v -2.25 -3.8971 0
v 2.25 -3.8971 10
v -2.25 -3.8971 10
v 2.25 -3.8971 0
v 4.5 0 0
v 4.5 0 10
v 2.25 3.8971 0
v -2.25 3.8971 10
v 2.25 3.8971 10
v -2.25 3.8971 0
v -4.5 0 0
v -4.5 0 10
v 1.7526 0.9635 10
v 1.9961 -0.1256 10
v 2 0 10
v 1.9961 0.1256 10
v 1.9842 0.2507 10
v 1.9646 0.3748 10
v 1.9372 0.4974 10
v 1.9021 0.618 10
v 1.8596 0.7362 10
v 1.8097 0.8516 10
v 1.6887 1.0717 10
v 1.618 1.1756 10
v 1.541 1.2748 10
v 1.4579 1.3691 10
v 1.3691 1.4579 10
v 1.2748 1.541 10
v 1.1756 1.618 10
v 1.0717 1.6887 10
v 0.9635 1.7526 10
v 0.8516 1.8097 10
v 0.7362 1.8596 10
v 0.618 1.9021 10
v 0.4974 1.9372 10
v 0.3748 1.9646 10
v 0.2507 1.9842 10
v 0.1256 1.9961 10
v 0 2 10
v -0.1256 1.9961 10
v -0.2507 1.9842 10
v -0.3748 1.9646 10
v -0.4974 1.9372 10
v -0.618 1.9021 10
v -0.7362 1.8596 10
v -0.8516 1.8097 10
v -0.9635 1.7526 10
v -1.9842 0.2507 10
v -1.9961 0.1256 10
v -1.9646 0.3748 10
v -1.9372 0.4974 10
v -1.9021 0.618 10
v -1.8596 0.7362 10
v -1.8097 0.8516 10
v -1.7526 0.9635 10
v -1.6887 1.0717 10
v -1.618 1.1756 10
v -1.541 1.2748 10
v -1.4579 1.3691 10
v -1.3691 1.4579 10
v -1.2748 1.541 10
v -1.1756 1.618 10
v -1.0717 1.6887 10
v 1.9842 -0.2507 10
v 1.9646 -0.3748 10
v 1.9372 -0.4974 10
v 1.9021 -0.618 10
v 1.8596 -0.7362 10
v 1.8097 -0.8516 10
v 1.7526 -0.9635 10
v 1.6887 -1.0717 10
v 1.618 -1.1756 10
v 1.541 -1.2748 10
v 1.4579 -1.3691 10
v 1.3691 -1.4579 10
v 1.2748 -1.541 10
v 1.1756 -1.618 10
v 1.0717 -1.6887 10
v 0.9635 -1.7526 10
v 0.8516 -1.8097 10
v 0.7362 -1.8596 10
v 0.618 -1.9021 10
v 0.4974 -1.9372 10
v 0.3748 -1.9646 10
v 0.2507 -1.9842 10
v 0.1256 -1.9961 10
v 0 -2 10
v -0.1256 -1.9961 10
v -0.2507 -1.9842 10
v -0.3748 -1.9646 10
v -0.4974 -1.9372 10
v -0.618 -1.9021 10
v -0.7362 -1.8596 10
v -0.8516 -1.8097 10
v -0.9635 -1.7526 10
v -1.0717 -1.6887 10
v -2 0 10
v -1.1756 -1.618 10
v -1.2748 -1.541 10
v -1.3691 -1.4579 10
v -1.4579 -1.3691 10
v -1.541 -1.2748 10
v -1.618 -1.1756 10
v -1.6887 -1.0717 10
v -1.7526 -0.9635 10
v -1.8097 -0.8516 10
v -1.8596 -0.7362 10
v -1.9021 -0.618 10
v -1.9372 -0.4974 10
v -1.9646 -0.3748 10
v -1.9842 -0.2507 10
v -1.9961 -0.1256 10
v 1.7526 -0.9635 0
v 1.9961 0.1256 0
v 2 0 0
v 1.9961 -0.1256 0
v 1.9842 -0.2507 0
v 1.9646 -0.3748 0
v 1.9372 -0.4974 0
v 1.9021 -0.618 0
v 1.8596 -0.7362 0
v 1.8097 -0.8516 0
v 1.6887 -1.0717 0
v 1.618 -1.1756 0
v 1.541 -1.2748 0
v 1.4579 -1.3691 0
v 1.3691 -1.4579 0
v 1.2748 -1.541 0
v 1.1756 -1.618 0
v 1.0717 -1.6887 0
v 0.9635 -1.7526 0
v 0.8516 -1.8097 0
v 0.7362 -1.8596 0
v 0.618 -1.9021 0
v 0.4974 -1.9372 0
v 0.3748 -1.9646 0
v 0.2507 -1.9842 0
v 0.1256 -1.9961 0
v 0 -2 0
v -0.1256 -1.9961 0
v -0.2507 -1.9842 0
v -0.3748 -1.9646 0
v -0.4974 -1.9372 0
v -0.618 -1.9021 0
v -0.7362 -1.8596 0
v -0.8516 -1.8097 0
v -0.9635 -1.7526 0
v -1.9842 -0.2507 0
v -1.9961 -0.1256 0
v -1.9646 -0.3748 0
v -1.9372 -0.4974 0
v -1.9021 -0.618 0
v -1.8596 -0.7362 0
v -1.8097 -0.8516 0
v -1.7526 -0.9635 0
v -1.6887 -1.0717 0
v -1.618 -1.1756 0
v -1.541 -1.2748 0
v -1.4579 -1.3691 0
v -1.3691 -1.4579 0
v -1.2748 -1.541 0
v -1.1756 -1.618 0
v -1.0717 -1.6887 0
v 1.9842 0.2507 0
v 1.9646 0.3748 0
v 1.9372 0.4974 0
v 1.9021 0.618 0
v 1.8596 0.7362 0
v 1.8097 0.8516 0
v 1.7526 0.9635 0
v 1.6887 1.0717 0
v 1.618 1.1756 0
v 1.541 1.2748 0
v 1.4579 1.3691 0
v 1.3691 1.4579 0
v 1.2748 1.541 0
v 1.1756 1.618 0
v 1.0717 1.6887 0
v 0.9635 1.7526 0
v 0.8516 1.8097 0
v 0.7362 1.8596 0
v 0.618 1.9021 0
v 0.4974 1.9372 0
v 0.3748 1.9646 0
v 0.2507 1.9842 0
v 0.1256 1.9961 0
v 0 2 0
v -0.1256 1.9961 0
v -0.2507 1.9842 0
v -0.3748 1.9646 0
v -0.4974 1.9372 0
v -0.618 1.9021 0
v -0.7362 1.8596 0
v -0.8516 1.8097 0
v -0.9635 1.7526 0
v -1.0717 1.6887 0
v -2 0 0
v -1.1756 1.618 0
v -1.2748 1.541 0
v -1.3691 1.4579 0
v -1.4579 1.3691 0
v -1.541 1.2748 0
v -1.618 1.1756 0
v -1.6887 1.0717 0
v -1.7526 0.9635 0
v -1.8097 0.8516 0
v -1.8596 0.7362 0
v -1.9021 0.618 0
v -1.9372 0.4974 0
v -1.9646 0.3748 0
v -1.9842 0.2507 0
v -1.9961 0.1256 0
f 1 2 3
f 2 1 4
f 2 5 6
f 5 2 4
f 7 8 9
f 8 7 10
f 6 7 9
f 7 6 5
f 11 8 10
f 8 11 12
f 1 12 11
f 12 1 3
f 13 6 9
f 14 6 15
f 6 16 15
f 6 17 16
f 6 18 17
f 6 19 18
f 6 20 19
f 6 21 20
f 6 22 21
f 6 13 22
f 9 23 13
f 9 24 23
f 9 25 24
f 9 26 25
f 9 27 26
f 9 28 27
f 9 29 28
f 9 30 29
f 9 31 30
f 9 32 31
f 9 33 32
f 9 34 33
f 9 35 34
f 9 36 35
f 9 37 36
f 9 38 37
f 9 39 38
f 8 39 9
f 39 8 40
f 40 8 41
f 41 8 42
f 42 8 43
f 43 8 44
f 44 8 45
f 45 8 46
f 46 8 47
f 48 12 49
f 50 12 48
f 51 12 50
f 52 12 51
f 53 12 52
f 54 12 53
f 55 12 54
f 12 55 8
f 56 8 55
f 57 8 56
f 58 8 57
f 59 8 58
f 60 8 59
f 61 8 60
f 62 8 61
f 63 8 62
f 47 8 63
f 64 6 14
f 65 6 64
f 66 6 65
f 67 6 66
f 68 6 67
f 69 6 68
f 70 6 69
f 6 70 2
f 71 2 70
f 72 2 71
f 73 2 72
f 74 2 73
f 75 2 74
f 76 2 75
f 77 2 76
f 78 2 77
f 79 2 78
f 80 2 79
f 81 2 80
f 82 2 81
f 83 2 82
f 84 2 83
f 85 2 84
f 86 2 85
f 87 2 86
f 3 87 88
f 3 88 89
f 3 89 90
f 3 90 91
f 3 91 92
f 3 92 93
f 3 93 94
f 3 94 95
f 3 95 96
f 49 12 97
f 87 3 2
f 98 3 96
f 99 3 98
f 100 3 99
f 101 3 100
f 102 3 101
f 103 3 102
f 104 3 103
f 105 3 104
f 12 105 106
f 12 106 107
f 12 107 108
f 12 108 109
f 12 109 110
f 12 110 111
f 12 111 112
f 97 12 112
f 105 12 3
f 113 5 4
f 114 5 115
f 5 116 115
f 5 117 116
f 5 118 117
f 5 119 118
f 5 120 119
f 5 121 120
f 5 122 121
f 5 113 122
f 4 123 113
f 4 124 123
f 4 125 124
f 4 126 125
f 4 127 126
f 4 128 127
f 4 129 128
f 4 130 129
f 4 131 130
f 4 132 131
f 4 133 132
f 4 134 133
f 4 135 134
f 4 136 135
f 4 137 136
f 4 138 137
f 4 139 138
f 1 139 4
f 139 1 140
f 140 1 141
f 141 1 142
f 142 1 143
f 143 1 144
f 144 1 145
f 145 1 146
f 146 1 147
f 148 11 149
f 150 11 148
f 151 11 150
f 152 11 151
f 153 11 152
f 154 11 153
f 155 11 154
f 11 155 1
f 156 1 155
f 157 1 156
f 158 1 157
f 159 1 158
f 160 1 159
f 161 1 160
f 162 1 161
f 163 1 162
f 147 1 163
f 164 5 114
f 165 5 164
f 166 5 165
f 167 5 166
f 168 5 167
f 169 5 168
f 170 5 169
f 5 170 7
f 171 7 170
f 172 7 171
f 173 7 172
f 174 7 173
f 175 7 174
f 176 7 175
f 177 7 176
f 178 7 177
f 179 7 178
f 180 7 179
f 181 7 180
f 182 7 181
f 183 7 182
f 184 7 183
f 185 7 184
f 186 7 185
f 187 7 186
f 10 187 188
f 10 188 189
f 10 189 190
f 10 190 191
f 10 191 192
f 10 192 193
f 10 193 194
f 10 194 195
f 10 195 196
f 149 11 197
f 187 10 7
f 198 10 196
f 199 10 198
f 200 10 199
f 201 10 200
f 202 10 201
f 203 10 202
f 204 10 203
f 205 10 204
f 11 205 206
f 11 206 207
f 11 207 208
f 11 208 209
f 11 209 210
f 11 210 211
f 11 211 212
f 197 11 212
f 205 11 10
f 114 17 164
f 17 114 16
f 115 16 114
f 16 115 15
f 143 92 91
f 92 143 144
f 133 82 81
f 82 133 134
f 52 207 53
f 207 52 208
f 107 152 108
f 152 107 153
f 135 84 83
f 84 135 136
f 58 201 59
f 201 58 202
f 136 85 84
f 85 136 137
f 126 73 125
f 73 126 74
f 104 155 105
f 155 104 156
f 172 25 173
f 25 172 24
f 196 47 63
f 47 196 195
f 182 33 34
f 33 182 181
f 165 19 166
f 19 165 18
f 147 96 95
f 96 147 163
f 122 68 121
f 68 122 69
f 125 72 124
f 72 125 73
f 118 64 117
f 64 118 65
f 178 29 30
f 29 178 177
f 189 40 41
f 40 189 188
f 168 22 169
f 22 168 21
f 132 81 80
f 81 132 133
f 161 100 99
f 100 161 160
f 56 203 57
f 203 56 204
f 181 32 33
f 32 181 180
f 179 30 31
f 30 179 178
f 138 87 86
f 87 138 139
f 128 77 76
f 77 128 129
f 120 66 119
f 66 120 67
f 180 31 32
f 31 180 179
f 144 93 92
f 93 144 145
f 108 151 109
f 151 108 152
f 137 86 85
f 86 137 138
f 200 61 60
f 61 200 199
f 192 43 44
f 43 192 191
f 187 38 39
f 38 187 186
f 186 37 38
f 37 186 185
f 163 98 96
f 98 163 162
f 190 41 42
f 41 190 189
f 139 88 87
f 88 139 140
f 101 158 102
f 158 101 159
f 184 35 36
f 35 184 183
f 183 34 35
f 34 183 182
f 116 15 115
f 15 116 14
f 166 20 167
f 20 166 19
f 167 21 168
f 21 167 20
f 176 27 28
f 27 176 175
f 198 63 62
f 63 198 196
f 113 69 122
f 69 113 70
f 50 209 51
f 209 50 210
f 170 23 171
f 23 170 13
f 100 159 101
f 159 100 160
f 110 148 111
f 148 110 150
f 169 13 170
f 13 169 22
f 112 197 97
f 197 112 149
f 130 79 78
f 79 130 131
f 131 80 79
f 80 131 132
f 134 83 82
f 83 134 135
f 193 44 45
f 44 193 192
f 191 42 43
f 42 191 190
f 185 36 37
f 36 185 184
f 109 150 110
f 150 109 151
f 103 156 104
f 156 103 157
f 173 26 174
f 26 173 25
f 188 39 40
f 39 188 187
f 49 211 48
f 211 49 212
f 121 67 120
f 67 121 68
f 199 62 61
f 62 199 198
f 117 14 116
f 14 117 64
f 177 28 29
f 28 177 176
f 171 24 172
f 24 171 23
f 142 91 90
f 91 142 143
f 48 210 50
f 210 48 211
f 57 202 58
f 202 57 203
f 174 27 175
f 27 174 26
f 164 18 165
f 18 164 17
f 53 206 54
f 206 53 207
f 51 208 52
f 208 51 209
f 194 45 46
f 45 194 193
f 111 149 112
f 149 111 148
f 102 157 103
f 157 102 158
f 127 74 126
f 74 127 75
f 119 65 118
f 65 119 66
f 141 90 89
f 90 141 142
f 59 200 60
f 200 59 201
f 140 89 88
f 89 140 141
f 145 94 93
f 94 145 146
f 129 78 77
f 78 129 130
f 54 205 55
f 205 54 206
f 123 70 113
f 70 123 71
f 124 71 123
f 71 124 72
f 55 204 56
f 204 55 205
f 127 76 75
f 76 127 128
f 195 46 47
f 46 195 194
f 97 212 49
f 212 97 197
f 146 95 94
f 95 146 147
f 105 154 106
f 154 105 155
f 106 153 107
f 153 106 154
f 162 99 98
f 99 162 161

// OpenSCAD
//difference() {
//cylinder(d=12, h=4);
//cylinder(d=7.5, h=4);
//}

difference() {
    cylinder(d=9, h=10, $fn=6);
    cylinder(d=4, h=10, $fn=100);
}
